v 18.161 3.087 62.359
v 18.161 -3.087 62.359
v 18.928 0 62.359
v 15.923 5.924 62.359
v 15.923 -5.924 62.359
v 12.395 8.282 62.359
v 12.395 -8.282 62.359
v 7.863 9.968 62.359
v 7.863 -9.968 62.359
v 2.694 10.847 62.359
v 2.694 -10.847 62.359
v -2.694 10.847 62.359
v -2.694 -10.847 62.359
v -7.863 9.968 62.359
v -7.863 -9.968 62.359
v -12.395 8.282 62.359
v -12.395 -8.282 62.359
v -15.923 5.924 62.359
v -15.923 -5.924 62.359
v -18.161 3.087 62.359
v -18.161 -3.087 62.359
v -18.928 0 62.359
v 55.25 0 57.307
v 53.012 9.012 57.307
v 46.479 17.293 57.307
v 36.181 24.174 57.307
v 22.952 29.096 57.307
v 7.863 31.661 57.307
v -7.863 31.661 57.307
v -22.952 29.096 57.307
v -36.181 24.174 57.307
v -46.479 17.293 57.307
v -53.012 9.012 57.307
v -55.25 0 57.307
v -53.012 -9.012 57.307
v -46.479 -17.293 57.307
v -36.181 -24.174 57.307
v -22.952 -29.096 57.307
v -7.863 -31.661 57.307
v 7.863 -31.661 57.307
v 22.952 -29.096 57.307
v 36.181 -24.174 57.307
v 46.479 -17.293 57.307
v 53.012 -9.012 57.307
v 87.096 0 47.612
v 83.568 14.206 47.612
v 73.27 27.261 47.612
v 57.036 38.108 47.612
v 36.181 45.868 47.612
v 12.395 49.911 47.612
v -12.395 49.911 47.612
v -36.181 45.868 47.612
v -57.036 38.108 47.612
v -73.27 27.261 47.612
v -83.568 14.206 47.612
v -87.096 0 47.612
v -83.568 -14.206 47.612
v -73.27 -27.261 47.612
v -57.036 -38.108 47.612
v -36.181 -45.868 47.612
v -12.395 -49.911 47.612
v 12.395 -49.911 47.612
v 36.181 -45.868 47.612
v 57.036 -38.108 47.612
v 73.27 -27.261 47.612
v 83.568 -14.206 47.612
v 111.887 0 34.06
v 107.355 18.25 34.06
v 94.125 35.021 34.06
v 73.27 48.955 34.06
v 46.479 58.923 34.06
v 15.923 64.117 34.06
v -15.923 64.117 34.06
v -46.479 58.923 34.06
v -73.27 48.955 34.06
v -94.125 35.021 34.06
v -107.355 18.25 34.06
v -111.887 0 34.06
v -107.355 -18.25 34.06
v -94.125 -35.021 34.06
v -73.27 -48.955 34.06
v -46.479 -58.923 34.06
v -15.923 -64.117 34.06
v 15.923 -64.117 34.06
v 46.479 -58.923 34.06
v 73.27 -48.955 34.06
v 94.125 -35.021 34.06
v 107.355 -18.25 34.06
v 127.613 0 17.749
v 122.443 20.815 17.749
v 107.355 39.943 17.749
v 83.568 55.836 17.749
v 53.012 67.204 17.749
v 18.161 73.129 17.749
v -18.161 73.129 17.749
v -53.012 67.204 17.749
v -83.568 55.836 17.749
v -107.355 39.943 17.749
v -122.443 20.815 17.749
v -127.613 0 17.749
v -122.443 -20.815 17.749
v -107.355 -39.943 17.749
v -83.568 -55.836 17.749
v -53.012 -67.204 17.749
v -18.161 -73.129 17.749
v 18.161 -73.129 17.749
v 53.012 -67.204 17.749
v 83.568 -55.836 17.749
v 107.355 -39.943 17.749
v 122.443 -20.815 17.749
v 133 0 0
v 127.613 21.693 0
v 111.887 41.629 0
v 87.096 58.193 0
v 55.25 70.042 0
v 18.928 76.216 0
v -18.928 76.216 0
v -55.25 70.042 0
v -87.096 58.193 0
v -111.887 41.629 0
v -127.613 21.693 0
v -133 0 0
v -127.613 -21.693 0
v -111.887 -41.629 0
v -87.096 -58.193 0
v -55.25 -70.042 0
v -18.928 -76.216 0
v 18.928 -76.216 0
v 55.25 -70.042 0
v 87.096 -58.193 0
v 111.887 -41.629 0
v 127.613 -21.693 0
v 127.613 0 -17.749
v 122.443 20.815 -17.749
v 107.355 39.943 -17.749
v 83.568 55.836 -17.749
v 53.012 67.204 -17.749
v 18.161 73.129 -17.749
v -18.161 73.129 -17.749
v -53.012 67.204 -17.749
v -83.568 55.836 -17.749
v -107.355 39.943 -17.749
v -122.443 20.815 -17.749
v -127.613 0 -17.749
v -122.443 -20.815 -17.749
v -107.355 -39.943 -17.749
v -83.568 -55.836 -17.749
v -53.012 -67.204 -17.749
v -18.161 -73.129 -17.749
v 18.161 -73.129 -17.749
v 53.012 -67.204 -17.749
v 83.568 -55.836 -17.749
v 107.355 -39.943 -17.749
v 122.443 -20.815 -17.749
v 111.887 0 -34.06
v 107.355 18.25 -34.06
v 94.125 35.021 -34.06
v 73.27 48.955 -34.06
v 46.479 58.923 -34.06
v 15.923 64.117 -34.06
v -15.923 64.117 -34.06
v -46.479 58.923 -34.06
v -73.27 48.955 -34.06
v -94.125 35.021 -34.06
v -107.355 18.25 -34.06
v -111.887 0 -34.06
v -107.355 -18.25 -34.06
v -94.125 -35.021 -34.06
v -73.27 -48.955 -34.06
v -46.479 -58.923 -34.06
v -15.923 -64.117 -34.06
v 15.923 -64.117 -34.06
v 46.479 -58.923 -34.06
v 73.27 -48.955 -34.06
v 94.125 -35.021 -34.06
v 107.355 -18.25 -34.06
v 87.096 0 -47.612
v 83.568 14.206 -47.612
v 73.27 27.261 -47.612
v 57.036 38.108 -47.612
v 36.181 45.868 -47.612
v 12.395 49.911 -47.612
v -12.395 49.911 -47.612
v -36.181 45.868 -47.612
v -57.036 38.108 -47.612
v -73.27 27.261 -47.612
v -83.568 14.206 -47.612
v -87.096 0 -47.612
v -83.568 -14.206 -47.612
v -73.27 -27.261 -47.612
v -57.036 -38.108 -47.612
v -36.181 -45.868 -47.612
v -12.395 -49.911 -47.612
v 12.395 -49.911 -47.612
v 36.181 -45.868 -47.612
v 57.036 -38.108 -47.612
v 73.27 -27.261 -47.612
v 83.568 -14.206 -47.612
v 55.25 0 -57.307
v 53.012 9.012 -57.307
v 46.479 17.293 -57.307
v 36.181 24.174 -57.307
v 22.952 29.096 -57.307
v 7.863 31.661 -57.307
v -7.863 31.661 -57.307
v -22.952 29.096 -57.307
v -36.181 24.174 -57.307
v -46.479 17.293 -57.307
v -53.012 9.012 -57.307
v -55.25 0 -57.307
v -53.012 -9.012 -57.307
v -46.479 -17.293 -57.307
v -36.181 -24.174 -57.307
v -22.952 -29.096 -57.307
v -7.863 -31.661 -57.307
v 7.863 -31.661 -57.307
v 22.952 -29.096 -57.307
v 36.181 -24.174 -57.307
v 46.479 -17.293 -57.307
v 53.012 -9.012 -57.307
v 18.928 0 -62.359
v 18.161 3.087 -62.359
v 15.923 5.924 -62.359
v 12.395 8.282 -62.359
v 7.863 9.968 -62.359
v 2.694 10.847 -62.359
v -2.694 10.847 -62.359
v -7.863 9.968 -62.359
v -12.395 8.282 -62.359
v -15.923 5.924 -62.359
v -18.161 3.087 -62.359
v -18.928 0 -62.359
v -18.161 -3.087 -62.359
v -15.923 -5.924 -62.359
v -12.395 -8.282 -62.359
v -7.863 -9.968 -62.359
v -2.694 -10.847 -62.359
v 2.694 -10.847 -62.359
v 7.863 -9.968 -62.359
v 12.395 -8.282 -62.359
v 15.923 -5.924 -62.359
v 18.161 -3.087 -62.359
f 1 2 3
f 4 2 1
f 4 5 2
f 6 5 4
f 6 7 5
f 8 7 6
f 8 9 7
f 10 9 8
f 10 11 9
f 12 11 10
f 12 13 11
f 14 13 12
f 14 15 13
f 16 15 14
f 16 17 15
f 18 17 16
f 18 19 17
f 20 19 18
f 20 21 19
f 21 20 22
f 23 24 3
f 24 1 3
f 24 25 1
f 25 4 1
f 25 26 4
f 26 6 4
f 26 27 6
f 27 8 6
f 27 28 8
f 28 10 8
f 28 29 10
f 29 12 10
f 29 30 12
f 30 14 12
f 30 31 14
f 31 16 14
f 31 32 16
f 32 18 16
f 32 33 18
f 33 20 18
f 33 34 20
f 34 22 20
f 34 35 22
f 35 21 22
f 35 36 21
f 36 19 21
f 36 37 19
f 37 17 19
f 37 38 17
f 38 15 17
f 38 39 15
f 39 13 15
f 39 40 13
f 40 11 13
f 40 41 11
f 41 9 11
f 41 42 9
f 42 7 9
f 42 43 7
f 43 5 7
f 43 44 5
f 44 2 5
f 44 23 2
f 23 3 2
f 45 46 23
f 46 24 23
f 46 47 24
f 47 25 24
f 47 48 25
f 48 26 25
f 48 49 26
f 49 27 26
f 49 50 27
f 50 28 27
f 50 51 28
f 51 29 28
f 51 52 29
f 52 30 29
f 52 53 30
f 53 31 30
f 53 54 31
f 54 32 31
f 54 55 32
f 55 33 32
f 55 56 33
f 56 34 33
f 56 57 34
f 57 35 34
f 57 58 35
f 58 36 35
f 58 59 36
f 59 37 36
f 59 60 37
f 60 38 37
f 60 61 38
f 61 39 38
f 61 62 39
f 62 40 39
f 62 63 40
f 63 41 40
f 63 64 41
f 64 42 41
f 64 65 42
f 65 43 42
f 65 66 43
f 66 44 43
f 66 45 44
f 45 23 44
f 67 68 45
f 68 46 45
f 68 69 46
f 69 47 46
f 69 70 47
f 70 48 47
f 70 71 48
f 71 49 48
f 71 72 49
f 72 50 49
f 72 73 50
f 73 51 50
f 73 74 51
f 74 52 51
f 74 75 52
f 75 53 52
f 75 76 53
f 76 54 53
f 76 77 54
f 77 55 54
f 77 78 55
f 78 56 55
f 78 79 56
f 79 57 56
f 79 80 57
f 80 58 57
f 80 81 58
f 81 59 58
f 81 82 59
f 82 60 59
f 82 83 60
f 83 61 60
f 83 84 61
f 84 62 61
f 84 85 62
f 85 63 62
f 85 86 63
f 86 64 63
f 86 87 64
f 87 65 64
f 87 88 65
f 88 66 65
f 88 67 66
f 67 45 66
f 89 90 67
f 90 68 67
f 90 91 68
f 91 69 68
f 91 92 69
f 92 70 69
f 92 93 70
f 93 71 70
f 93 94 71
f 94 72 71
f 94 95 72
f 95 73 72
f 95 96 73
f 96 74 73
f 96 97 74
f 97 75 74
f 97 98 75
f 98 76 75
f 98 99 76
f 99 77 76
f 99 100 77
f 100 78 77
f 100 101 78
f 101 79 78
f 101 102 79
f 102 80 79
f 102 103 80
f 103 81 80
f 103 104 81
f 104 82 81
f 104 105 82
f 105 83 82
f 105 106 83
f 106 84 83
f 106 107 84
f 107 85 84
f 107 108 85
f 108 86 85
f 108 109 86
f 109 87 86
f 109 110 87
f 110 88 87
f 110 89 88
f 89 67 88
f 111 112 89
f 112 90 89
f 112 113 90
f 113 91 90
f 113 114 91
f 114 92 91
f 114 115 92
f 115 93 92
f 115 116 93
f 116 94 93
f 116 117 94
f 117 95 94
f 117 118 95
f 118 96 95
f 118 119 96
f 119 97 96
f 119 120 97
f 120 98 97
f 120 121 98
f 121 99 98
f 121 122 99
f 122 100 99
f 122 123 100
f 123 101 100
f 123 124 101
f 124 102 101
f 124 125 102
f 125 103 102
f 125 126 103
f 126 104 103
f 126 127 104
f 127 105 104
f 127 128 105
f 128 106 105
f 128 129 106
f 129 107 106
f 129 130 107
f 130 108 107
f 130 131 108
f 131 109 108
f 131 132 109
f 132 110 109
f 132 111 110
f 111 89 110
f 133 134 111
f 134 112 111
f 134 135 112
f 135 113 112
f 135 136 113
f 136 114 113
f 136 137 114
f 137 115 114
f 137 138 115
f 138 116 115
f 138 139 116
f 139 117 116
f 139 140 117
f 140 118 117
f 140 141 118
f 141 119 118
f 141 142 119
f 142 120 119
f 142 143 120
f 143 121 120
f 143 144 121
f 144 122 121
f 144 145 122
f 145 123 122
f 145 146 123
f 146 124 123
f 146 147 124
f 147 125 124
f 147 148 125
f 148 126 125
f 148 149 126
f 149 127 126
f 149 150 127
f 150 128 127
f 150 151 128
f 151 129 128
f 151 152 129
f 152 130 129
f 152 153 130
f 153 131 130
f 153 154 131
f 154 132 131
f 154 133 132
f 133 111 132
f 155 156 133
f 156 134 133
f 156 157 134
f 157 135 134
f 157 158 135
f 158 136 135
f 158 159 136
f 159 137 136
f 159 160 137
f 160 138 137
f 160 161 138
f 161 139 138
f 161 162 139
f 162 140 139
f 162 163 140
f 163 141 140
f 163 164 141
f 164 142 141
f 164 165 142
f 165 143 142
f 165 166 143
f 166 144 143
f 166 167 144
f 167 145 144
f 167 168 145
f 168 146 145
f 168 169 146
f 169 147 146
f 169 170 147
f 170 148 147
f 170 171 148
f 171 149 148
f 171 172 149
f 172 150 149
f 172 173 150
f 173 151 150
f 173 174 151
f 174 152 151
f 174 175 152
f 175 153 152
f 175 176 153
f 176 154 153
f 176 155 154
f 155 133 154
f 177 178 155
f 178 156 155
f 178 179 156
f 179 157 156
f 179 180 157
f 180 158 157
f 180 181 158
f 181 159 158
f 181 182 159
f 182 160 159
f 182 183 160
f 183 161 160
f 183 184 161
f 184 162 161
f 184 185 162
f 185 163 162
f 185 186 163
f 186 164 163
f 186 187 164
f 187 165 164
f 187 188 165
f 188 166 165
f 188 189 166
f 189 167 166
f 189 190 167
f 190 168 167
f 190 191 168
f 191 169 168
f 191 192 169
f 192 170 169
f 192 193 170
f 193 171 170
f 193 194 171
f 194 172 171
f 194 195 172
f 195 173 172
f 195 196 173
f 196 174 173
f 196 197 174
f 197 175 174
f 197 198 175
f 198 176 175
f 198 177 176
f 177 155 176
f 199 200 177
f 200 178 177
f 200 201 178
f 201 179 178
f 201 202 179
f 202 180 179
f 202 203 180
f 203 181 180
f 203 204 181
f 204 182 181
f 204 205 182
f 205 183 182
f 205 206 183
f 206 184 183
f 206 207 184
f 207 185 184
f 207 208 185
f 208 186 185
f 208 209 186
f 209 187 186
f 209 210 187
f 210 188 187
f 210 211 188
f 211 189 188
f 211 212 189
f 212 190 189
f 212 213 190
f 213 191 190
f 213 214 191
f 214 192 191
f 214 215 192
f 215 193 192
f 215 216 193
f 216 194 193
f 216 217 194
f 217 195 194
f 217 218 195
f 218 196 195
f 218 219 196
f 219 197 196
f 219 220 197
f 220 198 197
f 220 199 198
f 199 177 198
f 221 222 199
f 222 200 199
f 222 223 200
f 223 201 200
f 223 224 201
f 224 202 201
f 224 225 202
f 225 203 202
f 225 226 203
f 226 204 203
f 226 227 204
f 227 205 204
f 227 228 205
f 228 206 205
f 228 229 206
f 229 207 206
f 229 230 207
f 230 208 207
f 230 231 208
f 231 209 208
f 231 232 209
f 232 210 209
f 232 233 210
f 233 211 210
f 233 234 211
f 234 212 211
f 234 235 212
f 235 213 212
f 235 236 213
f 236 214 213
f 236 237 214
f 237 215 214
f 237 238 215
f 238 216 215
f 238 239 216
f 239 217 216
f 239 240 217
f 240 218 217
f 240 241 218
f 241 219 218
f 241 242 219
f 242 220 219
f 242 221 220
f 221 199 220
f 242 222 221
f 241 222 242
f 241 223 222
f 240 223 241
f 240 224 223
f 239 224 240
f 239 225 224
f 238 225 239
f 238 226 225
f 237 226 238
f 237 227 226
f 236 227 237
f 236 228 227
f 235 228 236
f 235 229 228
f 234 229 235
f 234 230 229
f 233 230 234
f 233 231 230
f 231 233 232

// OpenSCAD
// Generated by SolidPython 1.0.1 on 2020-07-29 00:46:54


scale(v = [19, 11, 9]) {
	sphere(r = 7);
}
/***********************************************
*********      SolidPython code:      **********
************************************************
 
# import packages: SolidPython
from solid import *
from solid.utils import *
from itertools import chain, combinations, permutations


class Resize:

    def __init__(self, scad_file):
        self.scad_file = scad_file
        #self.scad_file = import_scad(scad_file)
        # cone/cylinder param:
        self.r1 = 0
        self.r2 = 0
        self.h = 0
        # rectangular prism param:
        self.w = 0
        self.l = 0
        # ellipse param:
        self.r = 0

    # import OpenScad code (file name corresponds to shape)


    # classify shape + parameters
    def assign(self, param1, param2, param3):
        if self.scad_file == 'cone.scad':
            self.r1 = param1
            self.r2 = param2
            self.h = param3
        elif self.scad_file == 'cylinder.scad':
            self.r1 = param1
            self.r2 = param2
            self.h = param3
        elif self.scad_file == 'rectangularPrism.scad':
            self.h = param1
            self.l = param2
            self.w = param3
        else:
            self.r = param1
            self.h = param2

    # resize parameters
    def iterate(self):
        x = range(3, 20, 2)
        i = 1
        if self.scad_file == 'cone.scad':
            tempList = list(permutations(x, 2))
            for temp in tempList:
                param1 = temp[0]
                param2 = temp[1]
                filepath = 'produced_scad_files/' + 'cone' + str(param1) + '_' + str(param2) + '_' + '.scad'
                scad_render_to_file(cylinder(h=param1, r1=param2, r2=0), filepath)

        elif self.scad_file == 'cylinder.scad':
            tempList = list(permutations(x, 3))
            for temp in tempList:
                param1 = temp[0]
                param2 = temp[1]
                filepath = 'produced_scad_files/' + 'cylinder' + str(param1) + '_' + str(param2) + '_' + '.scad'
                scad_render_to_file(cylinder(h=param1, r1=param2, r2=param2), filepath)

        elif self.scad_file == 'rectangularPrism.scad':
            tempList = list(permutations(x, 3))
            for temp in tempList:
                param1 = temp[0]
                param2 = temp[1]
                param3 = temp[2]
                filepath = 'produced_scad_files/' + 'rectangularPrism' + str(param1) + '_' + str(param2) + '_' + str(
                    param3) + '.scad'
                scad_render_to_file(cube(size=(param1, param2, param3)), filepath)

        elif self.scad_file == 'ellipse.scad':
            tempList = list(permutations(x, 4))
            for temp in tempList:
                param1 = temp[0]
                param2 = temp[1]
                param3 = temp[2]
                param4 = temp[3]
                filepath = 'produced_scad_files/' + 'ellipse' + str(param1) + '_' + str(param2) + '_' + str(param3) + '_' + str(param4) + '.scad'
                scad_render_to_file(scale([param1, param2, param3])(sphere(r=param4)), filepath)

    def render_to_scadfile(self):
        scad_render_to_file(scad, 'example.scad') 
 
************************************************/
